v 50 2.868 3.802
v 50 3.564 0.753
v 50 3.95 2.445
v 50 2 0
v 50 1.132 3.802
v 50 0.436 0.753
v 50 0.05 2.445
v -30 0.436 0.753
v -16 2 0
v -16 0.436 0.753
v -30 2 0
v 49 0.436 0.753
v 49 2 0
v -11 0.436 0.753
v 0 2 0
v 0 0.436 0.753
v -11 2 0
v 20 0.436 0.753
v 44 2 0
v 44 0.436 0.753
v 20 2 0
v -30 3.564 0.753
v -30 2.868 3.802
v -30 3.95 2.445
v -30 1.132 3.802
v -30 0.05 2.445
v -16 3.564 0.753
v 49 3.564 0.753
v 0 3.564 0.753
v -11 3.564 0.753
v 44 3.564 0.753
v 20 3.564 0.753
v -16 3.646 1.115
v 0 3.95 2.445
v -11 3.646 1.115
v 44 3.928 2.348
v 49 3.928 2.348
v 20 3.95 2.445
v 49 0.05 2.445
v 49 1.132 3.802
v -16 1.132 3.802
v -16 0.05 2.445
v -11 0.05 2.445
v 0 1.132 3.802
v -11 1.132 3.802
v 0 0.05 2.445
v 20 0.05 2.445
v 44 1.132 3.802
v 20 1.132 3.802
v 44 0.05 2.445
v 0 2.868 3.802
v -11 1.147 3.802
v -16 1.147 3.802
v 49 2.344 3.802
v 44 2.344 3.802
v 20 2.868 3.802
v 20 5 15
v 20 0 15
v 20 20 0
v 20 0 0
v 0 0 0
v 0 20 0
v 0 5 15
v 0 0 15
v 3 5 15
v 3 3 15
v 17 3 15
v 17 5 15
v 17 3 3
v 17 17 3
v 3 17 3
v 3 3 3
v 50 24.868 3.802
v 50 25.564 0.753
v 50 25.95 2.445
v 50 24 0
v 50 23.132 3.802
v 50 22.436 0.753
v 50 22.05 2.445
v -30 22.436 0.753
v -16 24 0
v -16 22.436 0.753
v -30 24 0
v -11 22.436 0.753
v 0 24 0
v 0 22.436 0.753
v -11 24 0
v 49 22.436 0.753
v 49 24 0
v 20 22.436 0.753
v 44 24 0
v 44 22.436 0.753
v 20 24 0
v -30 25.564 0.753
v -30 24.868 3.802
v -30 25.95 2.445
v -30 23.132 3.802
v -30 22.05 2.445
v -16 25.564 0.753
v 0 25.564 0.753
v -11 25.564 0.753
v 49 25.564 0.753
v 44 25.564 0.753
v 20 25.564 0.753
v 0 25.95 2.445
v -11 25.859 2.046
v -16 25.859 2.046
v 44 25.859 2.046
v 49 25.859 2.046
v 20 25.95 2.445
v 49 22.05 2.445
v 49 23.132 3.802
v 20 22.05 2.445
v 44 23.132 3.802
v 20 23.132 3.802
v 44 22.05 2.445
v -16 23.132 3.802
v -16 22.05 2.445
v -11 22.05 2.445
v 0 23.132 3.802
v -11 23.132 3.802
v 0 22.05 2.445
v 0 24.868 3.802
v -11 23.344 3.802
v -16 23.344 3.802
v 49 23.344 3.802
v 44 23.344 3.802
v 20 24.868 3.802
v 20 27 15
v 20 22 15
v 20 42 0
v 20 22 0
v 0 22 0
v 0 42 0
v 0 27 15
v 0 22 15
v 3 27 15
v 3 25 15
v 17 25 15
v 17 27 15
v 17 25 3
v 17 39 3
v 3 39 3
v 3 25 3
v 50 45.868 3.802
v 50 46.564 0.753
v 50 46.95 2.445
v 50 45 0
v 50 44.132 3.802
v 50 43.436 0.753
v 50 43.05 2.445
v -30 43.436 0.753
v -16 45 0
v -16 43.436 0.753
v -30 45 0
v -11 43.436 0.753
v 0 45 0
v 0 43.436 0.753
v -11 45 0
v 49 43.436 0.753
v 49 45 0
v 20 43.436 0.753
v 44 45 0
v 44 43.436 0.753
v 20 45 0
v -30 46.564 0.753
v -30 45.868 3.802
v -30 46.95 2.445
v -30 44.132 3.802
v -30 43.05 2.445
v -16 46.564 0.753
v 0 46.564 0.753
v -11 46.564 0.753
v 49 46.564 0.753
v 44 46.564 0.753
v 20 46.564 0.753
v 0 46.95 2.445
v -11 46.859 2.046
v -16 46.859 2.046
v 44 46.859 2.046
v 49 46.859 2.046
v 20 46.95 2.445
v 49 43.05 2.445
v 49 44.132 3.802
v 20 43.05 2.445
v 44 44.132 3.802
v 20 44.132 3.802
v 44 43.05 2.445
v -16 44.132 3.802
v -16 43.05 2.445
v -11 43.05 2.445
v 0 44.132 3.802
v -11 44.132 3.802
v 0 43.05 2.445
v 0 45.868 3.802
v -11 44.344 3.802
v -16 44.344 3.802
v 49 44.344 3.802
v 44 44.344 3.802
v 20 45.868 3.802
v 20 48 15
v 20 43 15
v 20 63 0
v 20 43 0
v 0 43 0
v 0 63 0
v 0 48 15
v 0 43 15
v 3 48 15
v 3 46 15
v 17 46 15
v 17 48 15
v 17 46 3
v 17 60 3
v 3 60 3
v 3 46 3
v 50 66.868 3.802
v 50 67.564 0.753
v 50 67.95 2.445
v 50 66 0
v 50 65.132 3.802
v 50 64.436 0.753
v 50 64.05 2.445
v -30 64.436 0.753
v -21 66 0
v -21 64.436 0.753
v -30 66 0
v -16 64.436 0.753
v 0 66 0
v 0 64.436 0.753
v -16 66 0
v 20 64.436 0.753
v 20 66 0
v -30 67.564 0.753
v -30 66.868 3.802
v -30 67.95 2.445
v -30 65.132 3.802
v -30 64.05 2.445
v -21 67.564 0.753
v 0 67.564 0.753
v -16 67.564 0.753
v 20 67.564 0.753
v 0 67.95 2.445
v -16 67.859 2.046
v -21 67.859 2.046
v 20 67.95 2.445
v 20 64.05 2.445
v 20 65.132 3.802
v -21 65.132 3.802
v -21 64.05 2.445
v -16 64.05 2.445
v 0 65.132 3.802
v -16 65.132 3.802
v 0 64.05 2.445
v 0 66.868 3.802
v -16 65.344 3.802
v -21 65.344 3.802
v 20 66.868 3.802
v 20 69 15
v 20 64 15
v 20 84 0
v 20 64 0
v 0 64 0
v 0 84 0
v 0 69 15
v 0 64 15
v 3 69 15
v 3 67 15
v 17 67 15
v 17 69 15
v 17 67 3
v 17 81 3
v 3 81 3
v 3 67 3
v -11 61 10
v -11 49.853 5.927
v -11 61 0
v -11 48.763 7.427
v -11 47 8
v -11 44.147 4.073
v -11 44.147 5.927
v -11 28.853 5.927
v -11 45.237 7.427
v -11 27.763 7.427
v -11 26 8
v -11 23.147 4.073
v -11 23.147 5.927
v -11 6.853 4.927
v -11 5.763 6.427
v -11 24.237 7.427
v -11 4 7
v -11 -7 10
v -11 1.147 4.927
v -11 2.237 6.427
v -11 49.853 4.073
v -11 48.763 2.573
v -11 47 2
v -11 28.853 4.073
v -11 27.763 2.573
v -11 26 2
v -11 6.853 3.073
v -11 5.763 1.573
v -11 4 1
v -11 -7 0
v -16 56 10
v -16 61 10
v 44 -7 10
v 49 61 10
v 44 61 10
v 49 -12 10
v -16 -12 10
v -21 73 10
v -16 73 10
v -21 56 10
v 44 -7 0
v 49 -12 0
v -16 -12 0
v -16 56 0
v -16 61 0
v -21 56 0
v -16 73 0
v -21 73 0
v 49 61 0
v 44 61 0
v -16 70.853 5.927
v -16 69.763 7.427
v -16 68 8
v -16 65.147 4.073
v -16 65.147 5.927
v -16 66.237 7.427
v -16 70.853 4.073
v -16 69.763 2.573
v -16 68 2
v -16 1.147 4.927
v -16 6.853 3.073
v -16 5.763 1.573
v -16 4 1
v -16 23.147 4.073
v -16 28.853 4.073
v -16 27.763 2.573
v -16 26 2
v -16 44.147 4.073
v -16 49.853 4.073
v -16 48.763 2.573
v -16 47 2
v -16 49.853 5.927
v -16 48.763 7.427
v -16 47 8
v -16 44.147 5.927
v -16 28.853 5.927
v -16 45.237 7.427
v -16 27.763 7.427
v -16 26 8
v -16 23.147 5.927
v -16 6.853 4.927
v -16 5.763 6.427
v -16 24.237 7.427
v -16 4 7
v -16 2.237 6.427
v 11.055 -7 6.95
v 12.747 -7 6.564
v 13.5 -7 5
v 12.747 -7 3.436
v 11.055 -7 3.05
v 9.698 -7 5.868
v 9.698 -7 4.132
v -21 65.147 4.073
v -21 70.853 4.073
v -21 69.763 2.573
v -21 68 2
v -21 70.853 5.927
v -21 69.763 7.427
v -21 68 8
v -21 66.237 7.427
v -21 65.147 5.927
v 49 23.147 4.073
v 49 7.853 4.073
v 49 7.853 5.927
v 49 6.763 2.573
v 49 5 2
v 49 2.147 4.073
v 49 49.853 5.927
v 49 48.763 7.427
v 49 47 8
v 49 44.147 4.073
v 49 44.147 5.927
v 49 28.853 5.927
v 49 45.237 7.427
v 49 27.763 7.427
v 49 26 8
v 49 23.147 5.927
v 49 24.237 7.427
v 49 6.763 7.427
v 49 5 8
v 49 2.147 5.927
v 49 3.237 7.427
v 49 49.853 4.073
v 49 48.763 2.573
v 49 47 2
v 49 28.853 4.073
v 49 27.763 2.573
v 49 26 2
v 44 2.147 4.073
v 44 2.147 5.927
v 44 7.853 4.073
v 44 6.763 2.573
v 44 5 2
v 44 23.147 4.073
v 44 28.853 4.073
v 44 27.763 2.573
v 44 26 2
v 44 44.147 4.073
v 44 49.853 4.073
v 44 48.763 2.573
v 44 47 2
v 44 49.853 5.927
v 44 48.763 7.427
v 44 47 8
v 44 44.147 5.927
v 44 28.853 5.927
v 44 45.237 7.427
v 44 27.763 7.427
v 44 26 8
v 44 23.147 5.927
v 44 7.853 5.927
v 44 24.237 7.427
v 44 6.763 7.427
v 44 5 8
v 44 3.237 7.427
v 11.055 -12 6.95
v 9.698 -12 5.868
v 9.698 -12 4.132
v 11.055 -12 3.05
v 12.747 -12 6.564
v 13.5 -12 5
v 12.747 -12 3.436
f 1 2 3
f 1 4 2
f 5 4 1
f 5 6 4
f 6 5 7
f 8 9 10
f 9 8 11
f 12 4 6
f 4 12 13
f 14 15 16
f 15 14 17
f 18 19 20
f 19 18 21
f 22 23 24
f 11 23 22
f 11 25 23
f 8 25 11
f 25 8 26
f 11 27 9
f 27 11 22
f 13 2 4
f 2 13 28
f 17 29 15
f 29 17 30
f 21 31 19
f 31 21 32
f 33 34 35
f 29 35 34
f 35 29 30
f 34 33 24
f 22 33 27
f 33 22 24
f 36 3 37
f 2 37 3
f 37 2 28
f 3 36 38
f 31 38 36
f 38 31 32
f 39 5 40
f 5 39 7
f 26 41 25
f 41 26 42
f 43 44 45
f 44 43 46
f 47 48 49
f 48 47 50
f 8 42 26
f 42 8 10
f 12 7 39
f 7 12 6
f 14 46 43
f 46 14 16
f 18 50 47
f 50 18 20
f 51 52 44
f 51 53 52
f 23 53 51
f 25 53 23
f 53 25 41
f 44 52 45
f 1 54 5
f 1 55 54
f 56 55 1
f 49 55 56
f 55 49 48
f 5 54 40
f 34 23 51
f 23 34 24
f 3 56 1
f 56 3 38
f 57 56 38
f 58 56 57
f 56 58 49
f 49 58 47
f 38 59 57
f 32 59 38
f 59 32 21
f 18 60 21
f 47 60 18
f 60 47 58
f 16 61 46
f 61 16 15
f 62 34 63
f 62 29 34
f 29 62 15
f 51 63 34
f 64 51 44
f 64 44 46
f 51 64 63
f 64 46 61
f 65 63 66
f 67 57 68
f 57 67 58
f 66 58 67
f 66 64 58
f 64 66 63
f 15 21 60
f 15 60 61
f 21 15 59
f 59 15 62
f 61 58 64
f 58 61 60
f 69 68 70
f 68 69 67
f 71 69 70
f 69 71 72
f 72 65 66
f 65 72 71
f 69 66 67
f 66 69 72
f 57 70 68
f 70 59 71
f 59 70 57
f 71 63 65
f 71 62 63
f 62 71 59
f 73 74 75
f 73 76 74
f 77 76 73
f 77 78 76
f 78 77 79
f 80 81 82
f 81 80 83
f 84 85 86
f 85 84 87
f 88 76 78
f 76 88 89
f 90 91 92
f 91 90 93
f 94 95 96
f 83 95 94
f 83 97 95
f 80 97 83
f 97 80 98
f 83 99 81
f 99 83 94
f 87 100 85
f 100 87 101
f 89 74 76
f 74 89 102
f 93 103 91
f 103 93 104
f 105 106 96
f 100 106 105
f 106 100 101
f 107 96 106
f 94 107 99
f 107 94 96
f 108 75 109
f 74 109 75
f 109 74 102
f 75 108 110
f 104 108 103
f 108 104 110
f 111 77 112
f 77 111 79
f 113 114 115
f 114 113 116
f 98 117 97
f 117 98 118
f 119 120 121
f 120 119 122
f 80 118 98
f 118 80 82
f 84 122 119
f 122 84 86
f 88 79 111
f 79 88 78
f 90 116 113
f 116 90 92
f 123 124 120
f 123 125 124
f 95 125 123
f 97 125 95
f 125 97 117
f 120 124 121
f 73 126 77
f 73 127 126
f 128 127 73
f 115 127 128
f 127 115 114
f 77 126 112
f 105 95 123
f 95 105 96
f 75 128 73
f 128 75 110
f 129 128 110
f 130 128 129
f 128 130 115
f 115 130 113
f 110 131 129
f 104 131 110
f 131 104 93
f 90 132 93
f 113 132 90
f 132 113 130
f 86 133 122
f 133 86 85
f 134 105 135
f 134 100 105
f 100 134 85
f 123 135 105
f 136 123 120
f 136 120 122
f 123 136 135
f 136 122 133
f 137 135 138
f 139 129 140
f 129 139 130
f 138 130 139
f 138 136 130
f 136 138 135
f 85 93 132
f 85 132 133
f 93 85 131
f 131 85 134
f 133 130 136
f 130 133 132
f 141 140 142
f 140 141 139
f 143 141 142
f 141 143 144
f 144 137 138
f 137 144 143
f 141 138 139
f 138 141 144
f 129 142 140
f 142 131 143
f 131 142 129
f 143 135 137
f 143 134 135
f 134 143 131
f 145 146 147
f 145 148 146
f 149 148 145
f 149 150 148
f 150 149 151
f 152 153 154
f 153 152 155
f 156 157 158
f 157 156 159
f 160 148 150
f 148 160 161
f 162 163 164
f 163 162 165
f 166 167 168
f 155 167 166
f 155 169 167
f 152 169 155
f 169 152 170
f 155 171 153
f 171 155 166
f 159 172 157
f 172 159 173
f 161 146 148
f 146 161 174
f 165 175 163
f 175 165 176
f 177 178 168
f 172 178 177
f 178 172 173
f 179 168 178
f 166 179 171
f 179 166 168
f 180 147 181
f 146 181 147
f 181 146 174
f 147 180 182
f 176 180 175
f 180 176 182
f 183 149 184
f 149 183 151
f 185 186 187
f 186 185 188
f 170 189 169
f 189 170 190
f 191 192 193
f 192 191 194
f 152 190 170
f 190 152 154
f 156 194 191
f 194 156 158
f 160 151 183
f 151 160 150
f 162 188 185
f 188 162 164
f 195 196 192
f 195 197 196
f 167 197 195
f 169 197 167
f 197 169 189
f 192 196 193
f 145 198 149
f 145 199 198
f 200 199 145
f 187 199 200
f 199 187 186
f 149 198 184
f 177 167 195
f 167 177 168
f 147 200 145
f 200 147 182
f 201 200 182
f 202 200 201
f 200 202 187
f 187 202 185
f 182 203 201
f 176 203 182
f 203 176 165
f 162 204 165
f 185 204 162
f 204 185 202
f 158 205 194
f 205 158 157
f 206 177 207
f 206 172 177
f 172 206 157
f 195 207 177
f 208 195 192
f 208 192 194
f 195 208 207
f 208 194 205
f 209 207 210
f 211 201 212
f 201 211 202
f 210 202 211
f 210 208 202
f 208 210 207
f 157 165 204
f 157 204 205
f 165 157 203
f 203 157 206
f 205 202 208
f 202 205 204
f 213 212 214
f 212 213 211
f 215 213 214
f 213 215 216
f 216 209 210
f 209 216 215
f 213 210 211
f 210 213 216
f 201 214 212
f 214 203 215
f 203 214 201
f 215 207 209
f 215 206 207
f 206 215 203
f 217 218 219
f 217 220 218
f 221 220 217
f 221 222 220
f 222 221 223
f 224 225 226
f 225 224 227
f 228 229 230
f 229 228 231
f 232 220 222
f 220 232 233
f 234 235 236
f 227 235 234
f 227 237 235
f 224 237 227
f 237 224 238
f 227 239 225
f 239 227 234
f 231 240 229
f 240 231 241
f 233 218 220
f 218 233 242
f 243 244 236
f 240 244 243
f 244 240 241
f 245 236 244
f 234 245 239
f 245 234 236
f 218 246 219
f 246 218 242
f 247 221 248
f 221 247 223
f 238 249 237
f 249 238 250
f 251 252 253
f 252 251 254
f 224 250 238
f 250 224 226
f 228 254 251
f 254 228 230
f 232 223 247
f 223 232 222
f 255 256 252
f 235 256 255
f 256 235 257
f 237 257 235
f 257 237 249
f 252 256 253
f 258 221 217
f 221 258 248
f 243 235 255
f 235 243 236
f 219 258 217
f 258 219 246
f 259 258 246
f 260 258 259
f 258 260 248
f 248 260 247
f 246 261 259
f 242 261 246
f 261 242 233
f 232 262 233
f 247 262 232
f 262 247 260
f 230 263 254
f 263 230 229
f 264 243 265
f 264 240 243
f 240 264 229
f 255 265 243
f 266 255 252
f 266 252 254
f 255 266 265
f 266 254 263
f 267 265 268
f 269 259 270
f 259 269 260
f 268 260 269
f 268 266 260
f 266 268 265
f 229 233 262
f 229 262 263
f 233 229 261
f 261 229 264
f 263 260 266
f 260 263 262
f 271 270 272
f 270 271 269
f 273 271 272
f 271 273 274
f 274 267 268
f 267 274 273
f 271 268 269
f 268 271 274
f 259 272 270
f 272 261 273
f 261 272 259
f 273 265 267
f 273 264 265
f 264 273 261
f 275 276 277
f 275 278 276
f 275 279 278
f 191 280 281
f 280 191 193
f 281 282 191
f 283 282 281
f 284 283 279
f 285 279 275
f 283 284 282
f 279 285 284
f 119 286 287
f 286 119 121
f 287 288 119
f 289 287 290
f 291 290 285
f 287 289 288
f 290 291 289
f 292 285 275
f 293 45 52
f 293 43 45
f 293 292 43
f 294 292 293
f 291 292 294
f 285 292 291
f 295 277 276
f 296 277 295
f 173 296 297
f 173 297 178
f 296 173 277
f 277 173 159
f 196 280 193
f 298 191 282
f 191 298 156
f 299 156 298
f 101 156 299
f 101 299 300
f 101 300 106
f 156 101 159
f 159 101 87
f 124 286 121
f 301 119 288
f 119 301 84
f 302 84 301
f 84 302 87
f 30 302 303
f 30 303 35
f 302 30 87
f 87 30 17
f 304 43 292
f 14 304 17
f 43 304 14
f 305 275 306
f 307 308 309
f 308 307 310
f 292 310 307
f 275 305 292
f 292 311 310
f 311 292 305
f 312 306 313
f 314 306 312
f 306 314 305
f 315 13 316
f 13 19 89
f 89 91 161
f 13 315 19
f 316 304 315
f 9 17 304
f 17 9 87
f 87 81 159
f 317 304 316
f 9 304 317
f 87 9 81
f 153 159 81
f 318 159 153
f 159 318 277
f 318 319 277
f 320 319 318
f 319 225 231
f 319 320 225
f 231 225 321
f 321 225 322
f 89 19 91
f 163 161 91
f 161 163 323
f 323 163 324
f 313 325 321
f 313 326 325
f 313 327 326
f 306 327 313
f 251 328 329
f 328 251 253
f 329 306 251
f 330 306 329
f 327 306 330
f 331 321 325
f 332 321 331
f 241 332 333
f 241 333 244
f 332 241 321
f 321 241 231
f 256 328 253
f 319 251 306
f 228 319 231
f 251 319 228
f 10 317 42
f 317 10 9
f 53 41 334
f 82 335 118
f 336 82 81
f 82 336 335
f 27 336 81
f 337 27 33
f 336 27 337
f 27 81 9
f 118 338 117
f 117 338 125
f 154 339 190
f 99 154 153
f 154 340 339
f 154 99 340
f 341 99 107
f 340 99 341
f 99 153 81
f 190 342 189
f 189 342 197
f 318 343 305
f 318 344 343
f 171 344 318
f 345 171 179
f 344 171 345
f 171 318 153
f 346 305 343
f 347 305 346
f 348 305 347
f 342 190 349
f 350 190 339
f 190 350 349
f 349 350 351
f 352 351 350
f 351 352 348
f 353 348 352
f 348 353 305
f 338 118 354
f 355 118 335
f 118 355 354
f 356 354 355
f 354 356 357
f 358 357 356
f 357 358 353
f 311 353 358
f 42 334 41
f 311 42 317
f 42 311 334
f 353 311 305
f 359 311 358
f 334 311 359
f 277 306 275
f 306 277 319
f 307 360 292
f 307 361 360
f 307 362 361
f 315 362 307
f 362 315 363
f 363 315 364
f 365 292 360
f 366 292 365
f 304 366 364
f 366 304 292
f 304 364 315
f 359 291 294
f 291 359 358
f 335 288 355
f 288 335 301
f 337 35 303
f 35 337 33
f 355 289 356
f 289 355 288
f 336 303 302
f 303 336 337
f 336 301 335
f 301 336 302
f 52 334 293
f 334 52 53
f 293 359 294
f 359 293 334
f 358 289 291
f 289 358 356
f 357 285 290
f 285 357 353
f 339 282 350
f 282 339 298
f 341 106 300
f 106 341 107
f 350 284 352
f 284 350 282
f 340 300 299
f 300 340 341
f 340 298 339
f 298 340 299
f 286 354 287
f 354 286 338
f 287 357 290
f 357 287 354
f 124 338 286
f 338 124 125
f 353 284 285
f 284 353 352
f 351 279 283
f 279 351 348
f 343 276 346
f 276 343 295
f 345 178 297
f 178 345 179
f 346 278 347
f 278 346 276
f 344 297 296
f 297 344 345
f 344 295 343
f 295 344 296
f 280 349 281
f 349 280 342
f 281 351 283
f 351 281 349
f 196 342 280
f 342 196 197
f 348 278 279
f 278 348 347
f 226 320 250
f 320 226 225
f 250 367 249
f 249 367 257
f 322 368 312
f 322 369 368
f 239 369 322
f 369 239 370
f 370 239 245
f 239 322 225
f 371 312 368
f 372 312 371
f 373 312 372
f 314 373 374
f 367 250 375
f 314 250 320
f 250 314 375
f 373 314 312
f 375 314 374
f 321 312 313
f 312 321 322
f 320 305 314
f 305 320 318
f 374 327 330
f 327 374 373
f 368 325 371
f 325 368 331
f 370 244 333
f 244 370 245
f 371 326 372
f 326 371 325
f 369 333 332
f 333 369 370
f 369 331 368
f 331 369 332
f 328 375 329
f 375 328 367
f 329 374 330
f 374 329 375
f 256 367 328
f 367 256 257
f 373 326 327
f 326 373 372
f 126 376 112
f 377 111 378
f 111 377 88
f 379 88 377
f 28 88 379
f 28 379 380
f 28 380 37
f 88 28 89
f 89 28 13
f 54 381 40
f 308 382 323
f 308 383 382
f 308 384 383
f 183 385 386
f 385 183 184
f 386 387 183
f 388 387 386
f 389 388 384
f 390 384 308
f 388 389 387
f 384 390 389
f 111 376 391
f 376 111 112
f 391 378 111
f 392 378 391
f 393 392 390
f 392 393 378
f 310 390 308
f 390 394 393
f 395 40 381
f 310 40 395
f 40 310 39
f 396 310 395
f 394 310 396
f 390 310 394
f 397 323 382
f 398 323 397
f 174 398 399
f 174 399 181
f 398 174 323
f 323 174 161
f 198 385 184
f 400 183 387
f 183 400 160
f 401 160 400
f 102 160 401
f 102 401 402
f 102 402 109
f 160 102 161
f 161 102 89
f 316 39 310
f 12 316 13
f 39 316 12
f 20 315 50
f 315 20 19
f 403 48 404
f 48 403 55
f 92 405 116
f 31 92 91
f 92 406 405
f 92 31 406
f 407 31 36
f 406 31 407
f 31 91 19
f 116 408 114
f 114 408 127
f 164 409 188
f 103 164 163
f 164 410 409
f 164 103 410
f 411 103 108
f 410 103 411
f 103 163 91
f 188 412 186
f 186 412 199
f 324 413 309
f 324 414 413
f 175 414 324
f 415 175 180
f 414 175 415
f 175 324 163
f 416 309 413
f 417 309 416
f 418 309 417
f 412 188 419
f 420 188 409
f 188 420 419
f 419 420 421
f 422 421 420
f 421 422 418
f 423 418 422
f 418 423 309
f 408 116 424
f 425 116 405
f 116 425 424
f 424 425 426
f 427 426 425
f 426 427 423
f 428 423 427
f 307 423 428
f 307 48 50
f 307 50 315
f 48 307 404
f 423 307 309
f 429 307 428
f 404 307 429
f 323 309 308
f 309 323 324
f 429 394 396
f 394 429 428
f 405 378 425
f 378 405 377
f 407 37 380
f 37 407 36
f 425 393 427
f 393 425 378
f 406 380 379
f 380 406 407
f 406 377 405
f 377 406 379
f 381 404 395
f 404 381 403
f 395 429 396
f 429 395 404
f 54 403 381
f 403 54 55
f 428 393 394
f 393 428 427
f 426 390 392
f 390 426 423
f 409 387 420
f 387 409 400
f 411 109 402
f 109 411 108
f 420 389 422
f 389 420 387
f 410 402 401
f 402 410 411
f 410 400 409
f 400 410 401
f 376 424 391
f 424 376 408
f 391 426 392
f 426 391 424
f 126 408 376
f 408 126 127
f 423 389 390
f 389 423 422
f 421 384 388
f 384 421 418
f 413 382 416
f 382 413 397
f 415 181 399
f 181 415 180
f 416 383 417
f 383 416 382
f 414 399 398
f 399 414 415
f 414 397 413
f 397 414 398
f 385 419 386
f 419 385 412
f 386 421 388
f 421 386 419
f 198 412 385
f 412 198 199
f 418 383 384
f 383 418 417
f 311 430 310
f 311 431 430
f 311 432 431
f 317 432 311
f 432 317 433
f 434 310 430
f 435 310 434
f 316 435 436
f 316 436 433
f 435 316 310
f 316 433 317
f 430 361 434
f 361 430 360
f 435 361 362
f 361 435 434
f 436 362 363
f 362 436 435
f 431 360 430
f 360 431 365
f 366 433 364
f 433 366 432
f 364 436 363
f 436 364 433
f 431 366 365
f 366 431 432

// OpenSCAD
module cart() {
	union() {
		difference() {
			translate([-30, 2, 2]) rotate(90, [0, 1, 0]) cylinder(r=2,h=80);
			cube([20, 20, 20]);
		}
		difference() {
			cube([20, 20, 15]);
			translate([3, 3, 3]) cube([14, 14, 18]);
			translate([-2, 20, 0]) rotate(45, [1, 0, 0])  cube([30, 30, 30]);
		}
	}
}
cart();
translate([0, 22, 0]) cart();
translate([0, 43, 0]) cart();
translate([0, 64, 0]) cart();

module clip() {
	union() {
		difference() {
			cube([5, 100, 10]);
			translate([-1, 4, 4]) rotate(90, [0, 1, 0]) cylinder(r=3, h=10);
		}
		translate([-5, 12, 0]) difference() {
			cube([5, 17, 10]);
			translate([-1, 12, 4]) rotate(90, [0, 1, 0]) cylinder(r=3, h=10);
		}
	}
}

//translate([-8, 0, 0]) clip();
/*translate([12, 0, 0]) clip();
translate([24, 0, 0]) clip();
translate([0, 40, 0]) clip();
translate([12, 40, 0]) clip();
translate([24, 40, 0]) clip();
*/

module puller() {
	difference() {
		union() {
				difference() {
				translate([0, -7, 0]) cube([5, 68, 10]);
				translate([-1, 4, 4]) rotate(90, [0, 1, 0]) cylinder(r=3, h=10);
				translate([-1, 26, 5]) rotate(90, [0, 1, 0]) cylinder(r=3, h=10);
				translate([-1, 47, 5]) rotate(90, [0, 1, 0]) cylinder(r=3, h=10);
			}
			translate([-5, 56, 0]) difference() {
				cube([5, 17, 10]);
				translate([-1, 12, 5]) rotate(90, [0, 1, 0]) cylinder(r=3, h=10);
			}
			translate([60, 0, 0]) difference() {
				translate([0, -7, 0]) cube([5, 68, 10]);
				translate([-1, 5, 5]) rotate(90, [0, 1, 0]) cylinder(r=3, h=10);
				translate([-1, 26, 5]) rotate(90, [0, 1, 0]) cylinder(r=3, h=10);
				translate([-1, 47, 5]) rotate(90, [0, 1, 0]) cylinder(r=3, h=10);
			}
			translate([0, -12, 0]) cube([65, 5, 10]);
		}
		translate([55/2, -5, 5]) rotate(90, [1, 0, 0]) cylinder(r=2, h=10);
	}
}

translate([-16, 0, 0]) 
puller();
		
